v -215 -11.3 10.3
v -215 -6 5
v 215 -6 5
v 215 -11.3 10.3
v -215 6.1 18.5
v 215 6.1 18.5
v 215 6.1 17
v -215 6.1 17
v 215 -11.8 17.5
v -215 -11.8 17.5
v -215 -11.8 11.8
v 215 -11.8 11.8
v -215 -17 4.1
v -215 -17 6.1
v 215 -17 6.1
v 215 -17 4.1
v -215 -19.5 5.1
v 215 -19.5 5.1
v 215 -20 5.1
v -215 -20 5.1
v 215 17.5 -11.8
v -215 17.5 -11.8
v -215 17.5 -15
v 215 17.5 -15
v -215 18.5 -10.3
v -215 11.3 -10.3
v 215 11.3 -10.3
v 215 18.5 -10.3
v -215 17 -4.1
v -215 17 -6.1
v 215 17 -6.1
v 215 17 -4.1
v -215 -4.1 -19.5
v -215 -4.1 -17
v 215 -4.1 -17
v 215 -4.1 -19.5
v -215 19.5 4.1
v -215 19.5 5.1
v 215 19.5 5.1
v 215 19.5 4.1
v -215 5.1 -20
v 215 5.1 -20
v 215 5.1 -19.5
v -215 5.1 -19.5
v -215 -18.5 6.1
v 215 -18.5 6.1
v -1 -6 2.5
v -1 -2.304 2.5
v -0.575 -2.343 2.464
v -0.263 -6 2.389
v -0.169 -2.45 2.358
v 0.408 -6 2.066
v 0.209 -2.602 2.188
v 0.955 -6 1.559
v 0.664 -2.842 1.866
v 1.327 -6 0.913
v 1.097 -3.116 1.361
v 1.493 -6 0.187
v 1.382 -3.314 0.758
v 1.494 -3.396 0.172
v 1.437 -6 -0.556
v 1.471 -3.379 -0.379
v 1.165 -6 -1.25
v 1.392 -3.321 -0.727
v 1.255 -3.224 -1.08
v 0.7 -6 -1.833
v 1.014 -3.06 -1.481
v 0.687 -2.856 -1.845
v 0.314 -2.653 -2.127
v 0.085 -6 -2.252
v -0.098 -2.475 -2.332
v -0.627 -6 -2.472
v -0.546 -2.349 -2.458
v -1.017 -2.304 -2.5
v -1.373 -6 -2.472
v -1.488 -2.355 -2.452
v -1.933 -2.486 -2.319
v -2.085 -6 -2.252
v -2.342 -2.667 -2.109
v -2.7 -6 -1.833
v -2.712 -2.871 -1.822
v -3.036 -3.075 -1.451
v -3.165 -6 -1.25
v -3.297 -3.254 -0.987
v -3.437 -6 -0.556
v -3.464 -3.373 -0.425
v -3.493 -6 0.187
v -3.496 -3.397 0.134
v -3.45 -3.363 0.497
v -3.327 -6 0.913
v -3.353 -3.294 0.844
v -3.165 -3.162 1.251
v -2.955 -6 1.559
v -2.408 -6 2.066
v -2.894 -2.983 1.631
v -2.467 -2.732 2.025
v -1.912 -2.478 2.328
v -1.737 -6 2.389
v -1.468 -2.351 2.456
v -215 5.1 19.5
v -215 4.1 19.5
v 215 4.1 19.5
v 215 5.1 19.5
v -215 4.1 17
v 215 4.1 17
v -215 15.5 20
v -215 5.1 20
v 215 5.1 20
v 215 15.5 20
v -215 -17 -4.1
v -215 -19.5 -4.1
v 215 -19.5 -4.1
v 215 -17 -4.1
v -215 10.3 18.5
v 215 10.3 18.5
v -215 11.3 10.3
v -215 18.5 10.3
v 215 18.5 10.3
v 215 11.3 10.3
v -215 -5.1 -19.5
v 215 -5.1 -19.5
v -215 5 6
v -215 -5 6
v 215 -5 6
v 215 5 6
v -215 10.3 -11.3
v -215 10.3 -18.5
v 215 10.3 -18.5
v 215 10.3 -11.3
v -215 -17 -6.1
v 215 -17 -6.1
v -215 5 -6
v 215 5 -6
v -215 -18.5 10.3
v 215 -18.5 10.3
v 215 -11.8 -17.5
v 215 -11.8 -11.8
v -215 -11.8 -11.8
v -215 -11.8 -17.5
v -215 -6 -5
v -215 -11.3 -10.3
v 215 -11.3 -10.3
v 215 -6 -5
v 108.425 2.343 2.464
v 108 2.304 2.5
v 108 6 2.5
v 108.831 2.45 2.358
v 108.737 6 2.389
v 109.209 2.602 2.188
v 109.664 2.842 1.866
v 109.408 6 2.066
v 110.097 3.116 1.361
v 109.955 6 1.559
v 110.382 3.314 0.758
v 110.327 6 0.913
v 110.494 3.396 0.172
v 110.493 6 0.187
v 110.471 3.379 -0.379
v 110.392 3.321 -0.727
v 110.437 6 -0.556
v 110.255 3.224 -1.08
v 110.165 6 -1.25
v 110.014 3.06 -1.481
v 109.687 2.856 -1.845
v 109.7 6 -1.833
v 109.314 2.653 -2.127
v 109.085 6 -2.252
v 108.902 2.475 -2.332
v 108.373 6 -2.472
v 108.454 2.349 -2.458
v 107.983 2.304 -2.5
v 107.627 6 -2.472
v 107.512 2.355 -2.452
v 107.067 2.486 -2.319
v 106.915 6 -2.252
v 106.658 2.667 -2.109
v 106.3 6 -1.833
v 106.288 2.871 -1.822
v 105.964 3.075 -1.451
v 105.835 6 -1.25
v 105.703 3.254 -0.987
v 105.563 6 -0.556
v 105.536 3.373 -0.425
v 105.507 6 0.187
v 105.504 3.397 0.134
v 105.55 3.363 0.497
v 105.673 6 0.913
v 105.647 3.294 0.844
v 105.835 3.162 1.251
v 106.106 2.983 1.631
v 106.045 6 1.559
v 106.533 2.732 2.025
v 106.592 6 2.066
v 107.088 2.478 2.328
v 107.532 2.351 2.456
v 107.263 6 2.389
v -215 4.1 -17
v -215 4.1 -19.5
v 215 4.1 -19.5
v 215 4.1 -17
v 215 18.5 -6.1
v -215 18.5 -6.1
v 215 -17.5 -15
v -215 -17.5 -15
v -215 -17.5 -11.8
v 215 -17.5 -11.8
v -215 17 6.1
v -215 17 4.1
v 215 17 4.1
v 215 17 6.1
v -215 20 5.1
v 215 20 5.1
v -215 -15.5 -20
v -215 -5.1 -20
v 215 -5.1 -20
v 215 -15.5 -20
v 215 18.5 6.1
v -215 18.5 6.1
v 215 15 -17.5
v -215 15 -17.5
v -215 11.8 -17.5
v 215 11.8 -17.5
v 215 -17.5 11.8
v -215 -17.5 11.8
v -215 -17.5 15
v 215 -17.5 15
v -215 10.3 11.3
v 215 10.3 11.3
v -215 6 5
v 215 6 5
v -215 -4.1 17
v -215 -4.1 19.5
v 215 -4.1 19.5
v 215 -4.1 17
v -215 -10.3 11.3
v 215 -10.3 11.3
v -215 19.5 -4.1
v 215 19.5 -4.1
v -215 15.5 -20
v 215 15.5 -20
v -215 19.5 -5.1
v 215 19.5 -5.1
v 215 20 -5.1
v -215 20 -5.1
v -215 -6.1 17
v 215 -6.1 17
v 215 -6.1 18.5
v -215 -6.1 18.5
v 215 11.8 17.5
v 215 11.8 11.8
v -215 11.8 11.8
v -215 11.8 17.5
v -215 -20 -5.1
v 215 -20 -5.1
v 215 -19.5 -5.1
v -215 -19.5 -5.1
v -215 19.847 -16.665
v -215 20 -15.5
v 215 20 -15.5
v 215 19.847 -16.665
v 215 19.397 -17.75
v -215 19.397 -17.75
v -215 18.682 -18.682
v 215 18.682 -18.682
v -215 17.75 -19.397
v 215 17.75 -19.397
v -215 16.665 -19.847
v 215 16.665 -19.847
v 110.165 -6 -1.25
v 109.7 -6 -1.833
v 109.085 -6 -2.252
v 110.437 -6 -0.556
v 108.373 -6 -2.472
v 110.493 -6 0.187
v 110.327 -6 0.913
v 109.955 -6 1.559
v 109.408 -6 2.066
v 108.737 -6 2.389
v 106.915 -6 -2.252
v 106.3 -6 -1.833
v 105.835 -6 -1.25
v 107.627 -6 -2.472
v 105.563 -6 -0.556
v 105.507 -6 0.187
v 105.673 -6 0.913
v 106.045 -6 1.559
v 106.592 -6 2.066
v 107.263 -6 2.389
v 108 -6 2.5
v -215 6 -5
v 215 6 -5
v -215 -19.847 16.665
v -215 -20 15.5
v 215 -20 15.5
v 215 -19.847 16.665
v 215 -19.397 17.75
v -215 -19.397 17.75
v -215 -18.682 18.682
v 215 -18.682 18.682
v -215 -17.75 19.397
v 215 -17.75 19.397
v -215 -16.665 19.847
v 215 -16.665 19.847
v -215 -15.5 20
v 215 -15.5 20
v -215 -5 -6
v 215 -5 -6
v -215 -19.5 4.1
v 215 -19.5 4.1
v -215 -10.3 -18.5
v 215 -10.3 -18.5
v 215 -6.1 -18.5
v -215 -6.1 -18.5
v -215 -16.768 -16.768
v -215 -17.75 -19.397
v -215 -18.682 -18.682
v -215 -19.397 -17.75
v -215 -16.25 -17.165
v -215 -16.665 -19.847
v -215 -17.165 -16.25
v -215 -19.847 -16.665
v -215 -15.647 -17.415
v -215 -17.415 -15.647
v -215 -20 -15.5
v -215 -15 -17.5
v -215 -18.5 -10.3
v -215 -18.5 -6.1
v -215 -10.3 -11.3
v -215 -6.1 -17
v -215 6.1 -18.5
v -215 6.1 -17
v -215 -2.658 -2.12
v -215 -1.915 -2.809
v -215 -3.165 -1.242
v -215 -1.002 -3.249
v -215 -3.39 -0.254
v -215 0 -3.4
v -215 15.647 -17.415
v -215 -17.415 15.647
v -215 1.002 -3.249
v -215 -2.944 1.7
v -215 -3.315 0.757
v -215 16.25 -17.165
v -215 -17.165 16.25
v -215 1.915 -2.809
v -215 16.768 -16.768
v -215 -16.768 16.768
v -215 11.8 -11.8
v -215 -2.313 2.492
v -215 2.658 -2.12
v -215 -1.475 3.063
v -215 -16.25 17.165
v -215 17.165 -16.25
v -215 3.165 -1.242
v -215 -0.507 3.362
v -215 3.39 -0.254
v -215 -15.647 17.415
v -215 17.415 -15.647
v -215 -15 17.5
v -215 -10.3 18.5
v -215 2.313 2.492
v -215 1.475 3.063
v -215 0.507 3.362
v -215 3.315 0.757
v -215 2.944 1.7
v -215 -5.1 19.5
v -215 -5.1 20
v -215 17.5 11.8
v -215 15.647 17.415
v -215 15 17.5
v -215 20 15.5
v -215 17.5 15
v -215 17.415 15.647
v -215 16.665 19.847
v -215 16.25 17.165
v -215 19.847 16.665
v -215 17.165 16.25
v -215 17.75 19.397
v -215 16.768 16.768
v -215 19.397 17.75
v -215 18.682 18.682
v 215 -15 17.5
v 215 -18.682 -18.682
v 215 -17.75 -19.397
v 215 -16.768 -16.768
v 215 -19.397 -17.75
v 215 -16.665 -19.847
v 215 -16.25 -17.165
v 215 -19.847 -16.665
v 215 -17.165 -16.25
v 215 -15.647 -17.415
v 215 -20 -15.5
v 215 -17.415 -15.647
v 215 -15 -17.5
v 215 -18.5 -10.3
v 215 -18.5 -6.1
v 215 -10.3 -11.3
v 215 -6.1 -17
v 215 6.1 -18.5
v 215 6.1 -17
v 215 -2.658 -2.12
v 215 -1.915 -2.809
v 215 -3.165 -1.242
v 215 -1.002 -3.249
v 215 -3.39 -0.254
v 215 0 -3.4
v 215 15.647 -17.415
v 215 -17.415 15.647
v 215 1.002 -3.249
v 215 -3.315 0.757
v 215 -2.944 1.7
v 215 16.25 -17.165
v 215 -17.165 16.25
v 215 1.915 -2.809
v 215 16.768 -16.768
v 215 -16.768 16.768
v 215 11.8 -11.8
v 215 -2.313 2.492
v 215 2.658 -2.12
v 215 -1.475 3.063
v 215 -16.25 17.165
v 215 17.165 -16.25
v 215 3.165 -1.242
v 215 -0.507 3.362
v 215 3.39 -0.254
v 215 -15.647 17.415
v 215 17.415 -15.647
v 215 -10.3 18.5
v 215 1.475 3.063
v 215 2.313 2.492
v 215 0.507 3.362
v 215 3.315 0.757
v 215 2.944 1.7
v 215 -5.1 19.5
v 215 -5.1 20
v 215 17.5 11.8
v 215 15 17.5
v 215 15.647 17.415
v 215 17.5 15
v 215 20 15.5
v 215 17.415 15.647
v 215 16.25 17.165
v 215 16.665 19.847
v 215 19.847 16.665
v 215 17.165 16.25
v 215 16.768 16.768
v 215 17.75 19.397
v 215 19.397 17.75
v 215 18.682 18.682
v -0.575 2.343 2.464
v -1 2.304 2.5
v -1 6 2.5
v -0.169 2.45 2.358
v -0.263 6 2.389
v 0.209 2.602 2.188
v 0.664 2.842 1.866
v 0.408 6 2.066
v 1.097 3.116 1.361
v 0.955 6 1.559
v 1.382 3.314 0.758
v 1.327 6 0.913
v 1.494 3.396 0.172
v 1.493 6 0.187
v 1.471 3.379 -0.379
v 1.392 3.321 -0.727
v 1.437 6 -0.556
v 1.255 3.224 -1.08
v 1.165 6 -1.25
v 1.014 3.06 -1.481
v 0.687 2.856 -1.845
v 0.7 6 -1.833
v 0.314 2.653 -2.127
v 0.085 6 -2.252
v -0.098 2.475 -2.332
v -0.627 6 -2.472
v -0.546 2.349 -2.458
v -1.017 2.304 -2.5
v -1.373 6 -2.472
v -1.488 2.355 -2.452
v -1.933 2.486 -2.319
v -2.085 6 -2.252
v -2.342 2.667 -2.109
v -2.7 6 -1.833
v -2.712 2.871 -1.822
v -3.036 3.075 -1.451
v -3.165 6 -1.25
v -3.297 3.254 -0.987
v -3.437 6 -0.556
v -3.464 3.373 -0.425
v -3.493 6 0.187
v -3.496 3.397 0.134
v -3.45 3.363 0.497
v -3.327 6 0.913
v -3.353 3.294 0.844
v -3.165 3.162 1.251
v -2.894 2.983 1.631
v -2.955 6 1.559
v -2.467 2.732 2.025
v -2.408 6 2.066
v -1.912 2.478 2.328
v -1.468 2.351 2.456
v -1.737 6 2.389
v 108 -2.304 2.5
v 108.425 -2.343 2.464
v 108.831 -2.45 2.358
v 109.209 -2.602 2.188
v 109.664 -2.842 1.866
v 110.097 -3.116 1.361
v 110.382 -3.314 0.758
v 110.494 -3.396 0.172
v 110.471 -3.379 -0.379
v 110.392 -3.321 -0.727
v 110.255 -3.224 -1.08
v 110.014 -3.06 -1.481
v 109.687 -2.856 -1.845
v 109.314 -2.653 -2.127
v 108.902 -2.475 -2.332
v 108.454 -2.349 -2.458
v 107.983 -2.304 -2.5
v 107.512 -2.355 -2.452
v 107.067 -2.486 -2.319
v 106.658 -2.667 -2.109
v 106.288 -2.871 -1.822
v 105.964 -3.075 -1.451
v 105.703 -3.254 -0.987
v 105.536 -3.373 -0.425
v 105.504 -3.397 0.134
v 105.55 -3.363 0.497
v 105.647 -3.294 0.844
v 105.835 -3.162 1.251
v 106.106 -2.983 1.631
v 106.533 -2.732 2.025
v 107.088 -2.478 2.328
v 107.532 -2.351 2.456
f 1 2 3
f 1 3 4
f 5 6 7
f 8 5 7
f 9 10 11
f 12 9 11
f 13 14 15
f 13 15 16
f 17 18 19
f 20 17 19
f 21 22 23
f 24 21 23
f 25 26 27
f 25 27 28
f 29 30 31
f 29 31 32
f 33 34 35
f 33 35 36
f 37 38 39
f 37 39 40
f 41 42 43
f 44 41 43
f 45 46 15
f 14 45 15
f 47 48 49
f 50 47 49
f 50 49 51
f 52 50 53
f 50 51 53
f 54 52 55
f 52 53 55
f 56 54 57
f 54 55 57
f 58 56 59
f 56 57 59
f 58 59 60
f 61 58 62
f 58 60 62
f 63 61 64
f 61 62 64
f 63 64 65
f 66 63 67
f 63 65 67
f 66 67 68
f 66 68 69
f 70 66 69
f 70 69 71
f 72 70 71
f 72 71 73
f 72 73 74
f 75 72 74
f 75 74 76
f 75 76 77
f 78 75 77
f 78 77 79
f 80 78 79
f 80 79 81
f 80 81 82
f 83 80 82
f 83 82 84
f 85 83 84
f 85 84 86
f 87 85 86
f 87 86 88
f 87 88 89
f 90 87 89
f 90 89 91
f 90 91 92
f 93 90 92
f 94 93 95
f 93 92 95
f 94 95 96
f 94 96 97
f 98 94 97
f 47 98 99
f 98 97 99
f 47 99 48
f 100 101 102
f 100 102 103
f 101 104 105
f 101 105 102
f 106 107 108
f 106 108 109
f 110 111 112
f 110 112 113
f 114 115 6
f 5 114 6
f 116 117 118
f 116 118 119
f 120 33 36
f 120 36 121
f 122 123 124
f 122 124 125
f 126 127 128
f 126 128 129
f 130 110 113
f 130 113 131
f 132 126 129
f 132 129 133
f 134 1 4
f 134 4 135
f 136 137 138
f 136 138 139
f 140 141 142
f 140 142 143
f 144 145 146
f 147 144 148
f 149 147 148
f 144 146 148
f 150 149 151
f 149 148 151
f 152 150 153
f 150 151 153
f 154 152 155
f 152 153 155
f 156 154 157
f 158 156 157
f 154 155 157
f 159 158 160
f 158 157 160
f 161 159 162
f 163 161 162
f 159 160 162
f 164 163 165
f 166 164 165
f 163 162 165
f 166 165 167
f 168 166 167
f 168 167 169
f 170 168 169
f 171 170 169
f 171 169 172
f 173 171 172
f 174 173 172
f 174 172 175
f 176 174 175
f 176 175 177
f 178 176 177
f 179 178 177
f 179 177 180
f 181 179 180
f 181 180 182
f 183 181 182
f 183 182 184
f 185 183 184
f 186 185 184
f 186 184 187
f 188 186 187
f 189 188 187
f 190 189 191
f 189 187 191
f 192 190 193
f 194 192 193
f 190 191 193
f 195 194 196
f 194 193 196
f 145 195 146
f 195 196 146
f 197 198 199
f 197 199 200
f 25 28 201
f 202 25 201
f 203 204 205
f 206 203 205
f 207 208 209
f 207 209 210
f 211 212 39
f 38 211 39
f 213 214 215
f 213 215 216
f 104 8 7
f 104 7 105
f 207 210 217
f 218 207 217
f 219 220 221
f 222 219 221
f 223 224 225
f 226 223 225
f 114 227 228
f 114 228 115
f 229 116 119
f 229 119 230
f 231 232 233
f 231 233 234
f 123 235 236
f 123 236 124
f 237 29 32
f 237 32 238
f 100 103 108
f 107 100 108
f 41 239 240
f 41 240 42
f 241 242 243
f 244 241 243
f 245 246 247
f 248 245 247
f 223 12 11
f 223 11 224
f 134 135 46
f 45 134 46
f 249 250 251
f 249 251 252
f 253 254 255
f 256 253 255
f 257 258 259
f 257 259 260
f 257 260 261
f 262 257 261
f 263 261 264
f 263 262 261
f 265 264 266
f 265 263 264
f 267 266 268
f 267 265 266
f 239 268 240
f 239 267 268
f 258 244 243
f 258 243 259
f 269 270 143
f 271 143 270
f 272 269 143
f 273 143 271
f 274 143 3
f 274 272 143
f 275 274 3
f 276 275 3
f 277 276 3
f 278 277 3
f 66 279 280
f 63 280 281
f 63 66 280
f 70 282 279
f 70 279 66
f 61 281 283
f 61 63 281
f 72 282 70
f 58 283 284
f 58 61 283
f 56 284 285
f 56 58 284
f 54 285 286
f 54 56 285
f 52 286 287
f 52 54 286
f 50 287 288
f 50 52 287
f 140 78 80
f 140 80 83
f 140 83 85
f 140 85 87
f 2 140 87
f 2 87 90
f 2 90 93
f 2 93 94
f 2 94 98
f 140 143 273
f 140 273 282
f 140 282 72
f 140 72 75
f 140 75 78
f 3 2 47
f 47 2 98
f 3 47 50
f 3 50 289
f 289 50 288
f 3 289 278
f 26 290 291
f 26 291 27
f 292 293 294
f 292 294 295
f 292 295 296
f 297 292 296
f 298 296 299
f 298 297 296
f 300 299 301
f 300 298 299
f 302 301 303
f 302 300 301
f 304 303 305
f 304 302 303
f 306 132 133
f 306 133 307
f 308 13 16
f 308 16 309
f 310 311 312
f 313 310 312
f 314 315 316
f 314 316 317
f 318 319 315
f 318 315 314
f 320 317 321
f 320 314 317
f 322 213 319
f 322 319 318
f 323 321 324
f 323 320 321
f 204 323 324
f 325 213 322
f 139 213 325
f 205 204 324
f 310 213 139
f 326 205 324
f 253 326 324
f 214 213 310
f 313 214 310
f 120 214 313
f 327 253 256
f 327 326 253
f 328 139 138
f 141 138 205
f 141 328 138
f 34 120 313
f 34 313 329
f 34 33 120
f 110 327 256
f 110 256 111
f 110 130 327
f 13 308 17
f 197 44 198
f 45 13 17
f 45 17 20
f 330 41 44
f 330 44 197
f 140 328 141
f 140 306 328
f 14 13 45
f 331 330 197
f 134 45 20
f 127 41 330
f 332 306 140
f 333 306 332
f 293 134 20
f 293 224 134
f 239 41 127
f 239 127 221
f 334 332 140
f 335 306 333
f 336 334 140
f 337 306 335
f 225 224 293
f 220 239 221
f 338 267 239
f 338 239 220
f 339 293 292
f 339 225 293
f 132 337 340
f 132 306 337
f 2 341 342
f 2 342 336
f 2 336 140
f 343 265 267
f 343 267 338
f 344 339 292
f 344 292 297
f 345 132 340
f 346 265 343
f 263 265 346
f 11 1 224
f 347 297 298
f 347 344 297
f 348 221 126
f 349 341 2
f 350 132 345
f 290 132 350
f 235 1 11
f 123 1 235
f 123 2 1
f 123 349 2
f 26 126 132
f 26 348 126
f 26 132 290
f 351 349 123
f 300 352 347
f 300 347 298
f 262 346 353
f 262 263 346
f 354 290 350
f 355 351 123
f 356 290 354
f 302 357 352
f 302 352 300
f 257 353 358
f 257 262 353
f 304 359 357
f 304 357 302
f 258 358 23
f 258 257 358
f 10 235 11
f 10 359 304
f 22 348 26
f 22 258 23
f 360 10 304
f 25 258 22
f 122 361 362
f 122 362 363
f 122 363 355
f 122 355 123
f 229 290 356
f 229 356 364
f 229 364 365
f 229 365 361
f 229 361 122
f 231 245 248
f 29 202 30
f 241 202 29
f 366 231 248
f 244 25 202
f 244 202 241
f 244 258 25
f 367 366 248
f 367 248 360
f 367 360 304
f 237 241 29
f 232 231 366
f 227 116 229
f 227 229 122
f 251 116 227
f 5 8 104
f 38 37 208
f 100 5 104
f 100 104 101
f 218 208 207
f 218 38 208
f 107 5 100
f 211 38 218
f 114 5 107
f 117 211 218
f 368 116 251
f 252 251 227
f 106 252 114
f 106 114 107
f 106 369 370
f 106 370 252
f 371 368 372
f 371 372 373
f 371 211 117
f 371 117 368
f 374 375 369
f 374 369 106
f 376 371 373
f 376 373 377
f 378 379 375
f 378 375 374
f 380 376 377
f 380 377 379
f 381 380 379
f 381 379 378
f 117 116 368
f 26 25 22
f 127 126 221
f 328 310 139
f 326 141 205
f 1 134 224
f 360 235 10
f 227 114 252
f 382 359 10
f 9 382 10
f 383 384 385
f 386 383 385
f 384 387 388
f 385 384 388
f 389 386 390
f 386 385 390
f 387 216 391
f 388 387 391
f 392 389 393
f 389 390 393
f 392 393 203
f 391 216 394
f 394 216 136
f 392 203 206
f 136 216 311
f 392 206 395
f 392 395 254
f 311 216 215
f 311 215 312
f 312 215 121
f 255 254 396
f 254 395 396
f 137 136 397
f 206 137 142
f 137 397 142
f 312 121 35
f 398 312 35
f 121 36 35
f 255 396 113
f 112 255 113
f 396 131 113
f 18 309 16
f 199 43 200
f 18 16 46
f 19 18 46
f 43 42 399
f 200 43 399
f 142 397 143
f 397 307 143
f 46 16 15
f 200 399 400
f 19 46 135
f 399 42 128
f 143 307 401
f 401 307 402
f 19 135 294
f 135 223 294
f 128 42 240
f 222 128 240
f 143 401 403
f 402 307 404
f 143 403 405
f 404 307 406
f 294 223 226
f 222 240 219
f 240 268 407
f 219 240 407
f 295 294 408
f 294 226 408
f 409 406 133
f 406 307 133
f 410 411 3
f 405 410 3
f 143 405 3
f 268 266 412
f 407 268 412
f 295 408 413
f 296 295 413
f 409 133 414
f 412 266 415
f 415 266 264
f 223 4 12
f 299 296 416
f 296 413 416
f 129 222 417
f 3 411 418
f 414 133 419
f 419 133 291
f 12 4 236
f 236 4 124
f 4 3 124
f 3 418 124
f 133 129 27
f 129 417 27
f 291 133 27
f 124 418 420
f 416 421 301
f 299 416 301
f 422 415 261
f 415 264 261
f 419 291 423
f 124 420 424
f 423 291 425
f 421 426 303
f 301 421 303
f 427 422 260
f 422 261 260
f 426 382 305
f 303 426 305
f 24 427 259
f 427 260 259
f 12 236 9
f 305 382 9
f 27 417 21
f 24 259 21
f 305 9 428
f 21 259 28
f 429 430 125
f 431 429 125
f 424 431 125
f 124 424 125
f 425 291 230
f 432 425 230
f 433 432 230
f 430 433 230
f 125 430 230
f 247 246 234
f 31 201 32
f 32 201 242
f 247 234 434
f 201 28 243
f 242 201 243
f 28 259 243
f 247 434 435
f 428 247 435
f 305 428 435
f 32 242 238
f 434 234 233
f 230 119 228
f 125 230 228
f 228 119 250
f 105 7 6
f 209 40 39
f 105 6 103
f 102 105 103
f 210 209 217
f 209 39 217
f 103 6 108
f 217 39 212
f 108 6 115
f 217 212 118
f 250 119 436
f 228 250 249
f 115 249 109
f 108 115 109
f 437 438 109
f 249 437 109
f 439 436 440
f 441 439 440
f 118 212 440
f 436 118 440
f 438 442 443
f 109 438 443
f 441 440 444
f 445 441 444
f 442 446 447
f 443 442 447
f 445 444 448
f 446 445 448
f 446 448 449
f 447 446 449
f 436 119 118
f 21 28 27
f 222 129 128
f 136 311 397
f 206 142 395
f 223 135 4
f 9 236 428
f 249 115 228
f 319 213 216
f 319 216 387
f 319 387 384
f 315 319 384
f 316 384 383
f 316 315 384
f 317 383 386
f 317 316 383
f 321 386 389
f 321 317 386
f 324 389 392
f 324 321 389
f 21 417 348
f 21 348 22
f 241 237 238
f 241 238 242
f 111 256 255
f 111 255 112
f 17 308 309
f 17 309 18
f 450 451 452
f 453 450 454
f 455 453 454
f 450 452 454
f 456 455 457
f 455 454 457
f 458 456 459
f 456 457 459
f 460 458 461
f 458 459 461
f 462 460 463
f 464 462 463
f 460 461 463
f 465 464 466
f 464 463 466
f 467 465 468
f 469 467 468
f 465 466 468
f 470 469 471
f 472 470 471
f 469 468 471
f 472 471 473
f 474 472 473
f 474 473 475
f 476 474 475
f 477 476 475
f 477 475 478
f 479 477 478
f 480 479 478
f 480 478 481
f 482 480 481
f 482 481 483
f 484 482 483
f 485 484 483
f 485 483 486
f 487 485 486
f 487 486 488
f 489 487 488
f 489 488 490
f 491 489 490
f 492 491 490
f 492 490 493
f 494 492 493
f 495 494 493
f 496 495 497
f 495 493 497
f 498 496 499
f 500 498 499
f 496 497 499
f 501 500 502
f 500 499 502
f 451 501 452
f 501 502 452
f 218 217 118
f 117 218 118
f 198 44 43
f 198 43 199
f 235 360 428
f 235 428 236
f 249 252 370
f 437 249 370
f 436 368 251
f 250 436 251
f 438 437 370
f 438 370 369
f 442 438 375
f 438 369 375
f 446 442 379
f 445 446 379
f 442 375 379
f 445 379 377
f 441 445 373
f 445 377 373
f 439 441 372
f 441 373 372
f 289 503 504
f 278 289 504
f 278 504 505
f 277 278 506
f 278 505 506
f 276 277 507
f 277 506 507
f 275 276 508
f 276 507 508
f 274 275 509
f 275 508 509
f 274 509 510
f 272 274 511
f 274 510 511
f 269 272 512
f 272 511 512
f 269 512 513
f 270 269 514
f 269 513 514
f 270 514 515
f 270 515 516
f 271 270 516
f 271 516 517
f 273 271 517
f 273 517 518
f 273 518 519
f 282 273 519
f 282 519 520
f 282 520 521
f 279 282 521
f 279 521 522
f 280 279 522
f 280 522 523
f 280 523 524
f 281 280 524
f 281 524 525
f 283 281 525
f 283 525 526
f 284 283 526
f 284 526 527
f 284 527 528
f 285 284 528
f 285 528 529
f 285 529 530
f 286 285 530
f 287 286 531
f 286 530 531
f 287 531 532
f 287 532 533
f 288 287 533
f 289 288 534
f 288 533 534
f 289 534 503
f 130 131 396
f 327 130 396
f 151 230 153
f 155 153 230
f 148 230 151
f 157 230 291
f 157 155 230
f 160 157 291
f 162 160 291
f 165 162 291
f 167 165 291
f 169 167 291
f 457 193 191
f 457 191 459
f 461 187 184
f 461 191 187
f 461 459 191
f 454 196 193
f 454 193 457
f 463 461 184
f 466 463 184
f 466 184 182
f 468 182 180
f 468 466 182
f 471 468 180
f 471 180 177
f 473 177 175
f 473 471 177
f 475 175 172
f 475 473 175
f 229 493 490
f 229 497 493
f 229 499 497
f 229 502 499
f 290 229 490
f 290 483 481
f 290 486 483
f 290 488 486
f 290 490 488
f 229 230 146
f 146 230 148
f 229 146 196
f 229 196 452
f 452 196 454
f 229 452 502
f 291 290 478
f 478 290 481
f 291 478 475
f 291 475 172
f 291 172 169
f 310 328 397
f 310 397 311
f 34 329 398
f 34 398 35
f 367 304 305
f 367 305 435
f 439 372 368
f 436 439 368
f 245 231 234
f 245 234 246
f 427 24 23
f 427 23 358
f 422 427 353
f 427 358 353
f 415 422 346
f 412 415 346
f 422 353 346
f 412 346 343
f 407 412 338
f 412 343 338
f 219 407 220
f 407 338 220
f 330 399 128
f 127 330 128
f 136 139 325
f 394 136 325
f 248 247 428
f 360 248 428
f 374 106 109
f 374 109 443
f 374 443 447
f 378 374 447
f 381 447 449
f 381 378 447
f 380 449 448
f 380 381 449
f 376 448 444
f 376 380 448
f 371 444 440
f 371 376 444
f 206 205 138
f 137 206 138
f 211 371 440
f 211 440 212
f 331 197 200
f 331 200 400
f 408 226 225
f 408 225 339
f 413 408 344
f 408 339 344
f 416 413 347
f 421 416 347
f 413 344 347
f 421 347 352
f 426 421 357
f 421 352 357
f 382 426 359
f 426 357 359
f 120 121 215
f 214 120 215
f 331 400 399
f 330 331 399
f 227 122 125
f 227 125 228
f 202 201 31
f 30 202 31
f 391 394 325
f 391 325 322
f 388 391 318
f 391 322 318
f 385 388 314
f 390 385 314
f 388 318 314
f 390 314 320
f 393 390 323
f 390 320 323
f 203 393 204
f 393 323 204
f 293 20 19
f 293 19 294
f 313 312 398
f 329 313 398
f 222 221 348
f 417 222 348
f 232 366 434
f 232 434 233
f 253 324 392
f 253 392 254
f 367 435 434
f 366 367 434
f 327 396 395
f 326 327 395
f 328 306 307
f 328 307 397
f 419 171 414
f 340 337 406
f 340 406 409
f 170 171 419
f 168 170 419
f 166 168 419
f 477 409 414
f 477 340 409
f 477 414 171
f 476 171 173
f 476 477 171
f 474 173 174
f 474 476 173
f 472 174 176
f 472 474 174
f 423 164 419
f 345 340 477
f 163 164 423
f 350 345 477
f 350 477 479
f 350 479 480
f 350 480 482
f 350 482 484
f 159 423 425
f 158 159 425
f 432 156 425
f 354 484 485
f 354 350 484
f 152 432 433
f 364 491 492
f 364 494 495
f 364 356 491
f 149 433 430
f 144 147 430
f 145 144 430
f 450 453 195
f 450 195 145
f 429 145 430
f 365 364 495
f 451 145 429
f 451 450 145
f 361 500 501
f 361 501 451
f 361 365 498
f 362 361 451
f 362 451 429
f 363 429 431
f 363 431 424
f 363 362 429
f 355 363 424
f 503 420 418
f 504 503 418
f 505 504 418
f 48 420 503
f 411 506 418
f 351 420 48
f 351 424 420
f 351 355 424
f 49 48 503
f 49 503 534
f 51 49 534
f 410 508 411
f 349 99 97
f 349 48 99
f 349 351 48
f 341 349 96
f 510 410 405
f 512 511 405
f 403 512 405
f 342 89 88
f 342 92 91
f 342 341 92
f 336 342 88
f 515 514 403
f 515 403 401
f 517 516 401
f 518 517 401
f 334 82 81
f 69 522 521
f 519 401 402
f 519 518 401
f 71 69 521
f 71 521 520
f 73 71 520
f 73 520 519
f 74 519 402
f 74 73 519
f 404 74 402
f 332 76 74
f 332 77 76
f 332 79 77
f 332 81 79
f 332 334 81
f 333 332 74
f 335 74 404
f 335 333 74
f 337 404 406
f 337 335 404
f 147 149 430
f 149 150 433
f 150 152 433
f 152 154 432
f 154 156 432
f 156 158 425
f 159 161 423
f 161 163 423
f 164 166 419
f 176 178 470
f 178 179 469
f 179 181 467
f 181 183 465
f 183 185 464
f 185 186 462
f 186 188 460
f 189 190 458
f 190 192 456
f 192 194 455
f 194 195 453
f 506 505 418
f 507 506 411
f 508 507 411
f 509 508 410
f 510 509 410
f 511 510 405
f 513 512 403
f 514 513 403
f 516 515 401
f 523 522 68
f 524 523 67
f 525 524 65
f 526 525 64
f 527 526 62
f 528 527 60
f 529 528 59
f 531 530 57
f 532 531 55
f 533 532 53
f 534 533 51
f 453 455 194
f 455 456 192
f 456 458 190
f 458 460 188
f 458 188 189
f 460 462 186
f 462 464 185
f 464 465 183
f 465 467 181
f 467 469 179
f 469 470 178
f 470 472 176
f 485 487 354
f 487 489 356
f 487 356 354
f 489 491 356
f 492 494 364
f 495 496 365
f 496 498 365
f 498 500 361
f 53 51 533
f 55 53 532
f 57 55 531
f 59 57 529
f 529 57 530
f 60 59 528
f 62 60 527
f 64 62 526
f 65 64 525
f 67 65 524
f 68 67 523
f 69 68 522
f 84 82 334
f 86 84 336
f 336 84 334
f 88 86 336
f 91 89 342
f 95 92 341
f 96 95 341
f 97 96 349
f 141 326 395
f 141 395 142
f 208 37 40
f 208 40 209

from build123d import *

# Parameters (mm, degrees)
SKETCH1_R                 = 3.4
F_40_X_40L_X_R4_5_1_DEPTH = 430
SKETCH_2_R                = 2.5
CUT_EXTRUDE_1_DEPTH       = 220.60191256


with BuildPart() as part:
    # Sketch1 → 铝型材 40 X 40L X R4.5(1) (new body)
    with BuildSketch(Plane(origin=(-215, 0, 0), x_dir=(0, 0, -1), z_dir=(1, 0, 0))):
        with BuildLine():
            Line((-5.1, 20), (-5.1, 19.5))
            Line((-5.1, 19.5), (-4.1, 19.5))
            Line((-4.1, 19.5), (-4.1, 17))
            Line((-4.1, 17), (-6.1, 17))
            Line((-6.1, 17), (-6.1, 18.5))
            Line((-6.1, 18.5), (-10.3, 18.5))
            Line((-10.3, 18.5), (-10.3, 11.3))
            Line((-10.3, 11.3), (-5, 6))
            Line((-5, 6), (5, 6))
            Line((5, 6), (10.3, 11.3))
            Line((10.3, 11.3), (10.3, 18.5))
            Line((10.3, 18.5), (6.1, 18.5))
            Line((6.1, 18.5), (6.1, 17))
            Line((6.1, 17), (4.1, 17))
            Line((4.1, 17), (4.1, 19.5))
            Line((4.1, 19.5), (5.1, 19.5))
            Line((5.1, 19.5), (5.1, 20))
            Line((5.1, 20), (15.5, 20))
            ThreePointArc((15.5, 20), (18.681980515, 18.681980515), (20, 15.5))
            Line((20, 15.5), (20, 5.1))
            Line((20, 5.1), (19.5, 5.1))
            Line((19.5, 5.1), (19.5, 4.1))
            Line((19.5, 4.1), (17, 4.1))
            Line((17, 4.1), (17, 6.1))
            Line((17, 6.1), (18.5, 6.1))
            Line((18.5, 6.1), (18.5, 10.3))
            Line((18.5, 10.3), (11.3, 10.3))
            Line((11.3, 10.3), (6, 5))
            Line((6, 5), (6, -5))
            Line((6, -5), (11.3, -10.3))
            Line((11.3, -10.3), (18.5, -10.3))
            Line((18.5, -10.3), (18.5, -6.1))
            Line((18.5, -6.1), (17, -6.1))
            Line((17, -6.1), (17, -4.1))
            Line((17, -4.1), (19.5, -4.1))
            Line((19.5, -4.1), (19.5, -5.1))
            Line((19.5, -5.1), (20, -5.1))
            Line((20, -5.1), (20, -15.5))
            ThreePointArc((20, -15.5), (18.681980515, -18.681980515), (15.5, -20))
            Line((15.5, -20), (5.1, -20))
            Line((5.1, -20), (5.1, -19.5))
            Line((5.1, -19.5), (4.1, -19.5))
            Line((4.1, -19.5), (4.1, -17))
            Line((4.1, -17), (6.1, -17))
            Line((6.1, -17), (6.1, -18.5))
            Line((6.1, -18.5), (10.3, -18.5))
            Line((10.3, -18.5), (10.3, -11.3))
            Line((10.3, -11.3), (5, -6))
            Line((5, -6), (-5, -6))
            Line((-5, -6), (-10.3, -11.3))
            Line((-10.3, -11.3), (-10.3, -18.5))
            Line((-10.3, -18.5), (-6.1, -18.5))
            Line((-6.1, -18.5), (-6.1, -17))
            Line((-6.1, -17), (-4.1, -17))
            Line((-4.1, -17), (-4.1, -19.5))
            Line((-4.1, -19.5), (-5.1, -19.5))
            Line((-5.1, -19.5), (-5.1, -20))
            Line((-5.1, -20), (-15.5, -20))
            ThreePointArc((-15.5, -20), (-18.681980515, -18.681980515), (-20, -15.5))
            Line((-20, -15.5), (-20, -5.1))
            Line((-20, -5.1), (-19.5, -5.1))
            Line((-19.5, -5.1), (-19.5, -4.1))
            Line((-19.5, -4.1), (-17, -4.1))
            Line((-17, -4.1), (-17, -6.1))
            Line((-17, -6.1), (-18.5, -6.1))
            Line((-18.5, -6.1), (-18.5, -10.3))
            Line((-18.5, -10.3), (-11.3, -10.3))
            Line((-11.3, -10.3), (-6, -5))
            Line((-6, -5), (-6, 5))
            Line((-6, 5), (-11.3, 10.3))
            Line((-11.3, 10.3), (-18.5, 10.3))
            Line((-18.5, 10.3), (-18.5, 6.1))
            Line((-18.5, 6.1), (-17, 6.1))
            Line((-17, 6.1), (-17, 4.1))
            Line((-17, 4.1), (-19.5, 4.1))
            Line((-19.5, 4.1), (-19.5, 5.1))
            Line((-19.5, 5.1), (-20, 5.1))
            Line((-20, 5.1), (-20, 15.5))
            ThreePointArc((-20, 15.5), (-18.681980515, 18.681980515), (-15.5, 20))
            Line((-15.5, 20), (-5.1, 20))
        make_face()
        Circle(SKETCH1_R, mode=Mode.SUBTRACT)
        with BuildLine():
            Line((11.8, 17.5), (15, 17.5))
            ThreePointArc((15, 17.5), (16.767766953, 16.767766953), (17.5, 15))
            Line((17.5, 15), (17.5, 11.8))
            Line((17.5, 11.8), (11.8, 11.8))
            Line((11.8, 11.8), (11.8, 17.5))
        make_face(mode=Mode.SUBTRACT)
        with BuildLine():
            Line((-15, 17.5), (-11.8, 17.5))
            Line((-11.8, 17.5), (-11.8, 11.8))
            Line((-11.8, 11.8), (-17.5, 11.8))
            Line((-17.5, 11.8), (-17.5, 15))
            ThreePointArc((-17.5, 15), (-16.767766953, 16.767766953), (-15, 17.5))
        make_face(mode=Mode.SUBTRACT)
        with BuildLine():
            Line((-17.5, -11.8), (-11.8, -11.8))
            Line((-11.8, -11.8), (-11.8, -17.5))
            Line((-11.8, -17.5), (-15, -17.5))
            ThreePointArc((-15, -17.5), (-16.767766953, -16.767766953), (-17.5, -15))
            Line((-17.5, -15), (-17.5, -11.8))
        make_face(mode=Mode.SUBTRACT)
        with BuildLine():
            Line((11.8, -11.8), (17.5, -11.8))
            Line((17.5, -11.8), (17.5, -15))
            ThreePointArc((17.5, -15), (16.767766953, -16.767766953), (15, -17.5))
            Line((15, -17.5), (11.8, -17.5))
            Line((11.8, -17.5), (11.8, -11.8))
        make_face(mode=Mode.SUBTRACT)
    extrude(amount=F_40_X_40L_X_R4_5_1_DEPTH)

    # 草图2 → 切除-拉伸1 (cut, through all)
    with BuildSketch(Plane(origin=(0, 20, 0), x_dir=(1, 0, 0), z_dir=(0, 1, 0))):
        with Locations(Location((-1, 0, 0), (0, 0, 270))):
            Circle(SKETCH_2_R)
        with Locations(Location((108, 0, 0), (0, 0, 270))):
            Circle(SKETCH_2_R)
    extrude(amount=-CUT_EXTRUDE_1_DEPTH, mode=Mode.SUBTRACT)


solid = part.part
